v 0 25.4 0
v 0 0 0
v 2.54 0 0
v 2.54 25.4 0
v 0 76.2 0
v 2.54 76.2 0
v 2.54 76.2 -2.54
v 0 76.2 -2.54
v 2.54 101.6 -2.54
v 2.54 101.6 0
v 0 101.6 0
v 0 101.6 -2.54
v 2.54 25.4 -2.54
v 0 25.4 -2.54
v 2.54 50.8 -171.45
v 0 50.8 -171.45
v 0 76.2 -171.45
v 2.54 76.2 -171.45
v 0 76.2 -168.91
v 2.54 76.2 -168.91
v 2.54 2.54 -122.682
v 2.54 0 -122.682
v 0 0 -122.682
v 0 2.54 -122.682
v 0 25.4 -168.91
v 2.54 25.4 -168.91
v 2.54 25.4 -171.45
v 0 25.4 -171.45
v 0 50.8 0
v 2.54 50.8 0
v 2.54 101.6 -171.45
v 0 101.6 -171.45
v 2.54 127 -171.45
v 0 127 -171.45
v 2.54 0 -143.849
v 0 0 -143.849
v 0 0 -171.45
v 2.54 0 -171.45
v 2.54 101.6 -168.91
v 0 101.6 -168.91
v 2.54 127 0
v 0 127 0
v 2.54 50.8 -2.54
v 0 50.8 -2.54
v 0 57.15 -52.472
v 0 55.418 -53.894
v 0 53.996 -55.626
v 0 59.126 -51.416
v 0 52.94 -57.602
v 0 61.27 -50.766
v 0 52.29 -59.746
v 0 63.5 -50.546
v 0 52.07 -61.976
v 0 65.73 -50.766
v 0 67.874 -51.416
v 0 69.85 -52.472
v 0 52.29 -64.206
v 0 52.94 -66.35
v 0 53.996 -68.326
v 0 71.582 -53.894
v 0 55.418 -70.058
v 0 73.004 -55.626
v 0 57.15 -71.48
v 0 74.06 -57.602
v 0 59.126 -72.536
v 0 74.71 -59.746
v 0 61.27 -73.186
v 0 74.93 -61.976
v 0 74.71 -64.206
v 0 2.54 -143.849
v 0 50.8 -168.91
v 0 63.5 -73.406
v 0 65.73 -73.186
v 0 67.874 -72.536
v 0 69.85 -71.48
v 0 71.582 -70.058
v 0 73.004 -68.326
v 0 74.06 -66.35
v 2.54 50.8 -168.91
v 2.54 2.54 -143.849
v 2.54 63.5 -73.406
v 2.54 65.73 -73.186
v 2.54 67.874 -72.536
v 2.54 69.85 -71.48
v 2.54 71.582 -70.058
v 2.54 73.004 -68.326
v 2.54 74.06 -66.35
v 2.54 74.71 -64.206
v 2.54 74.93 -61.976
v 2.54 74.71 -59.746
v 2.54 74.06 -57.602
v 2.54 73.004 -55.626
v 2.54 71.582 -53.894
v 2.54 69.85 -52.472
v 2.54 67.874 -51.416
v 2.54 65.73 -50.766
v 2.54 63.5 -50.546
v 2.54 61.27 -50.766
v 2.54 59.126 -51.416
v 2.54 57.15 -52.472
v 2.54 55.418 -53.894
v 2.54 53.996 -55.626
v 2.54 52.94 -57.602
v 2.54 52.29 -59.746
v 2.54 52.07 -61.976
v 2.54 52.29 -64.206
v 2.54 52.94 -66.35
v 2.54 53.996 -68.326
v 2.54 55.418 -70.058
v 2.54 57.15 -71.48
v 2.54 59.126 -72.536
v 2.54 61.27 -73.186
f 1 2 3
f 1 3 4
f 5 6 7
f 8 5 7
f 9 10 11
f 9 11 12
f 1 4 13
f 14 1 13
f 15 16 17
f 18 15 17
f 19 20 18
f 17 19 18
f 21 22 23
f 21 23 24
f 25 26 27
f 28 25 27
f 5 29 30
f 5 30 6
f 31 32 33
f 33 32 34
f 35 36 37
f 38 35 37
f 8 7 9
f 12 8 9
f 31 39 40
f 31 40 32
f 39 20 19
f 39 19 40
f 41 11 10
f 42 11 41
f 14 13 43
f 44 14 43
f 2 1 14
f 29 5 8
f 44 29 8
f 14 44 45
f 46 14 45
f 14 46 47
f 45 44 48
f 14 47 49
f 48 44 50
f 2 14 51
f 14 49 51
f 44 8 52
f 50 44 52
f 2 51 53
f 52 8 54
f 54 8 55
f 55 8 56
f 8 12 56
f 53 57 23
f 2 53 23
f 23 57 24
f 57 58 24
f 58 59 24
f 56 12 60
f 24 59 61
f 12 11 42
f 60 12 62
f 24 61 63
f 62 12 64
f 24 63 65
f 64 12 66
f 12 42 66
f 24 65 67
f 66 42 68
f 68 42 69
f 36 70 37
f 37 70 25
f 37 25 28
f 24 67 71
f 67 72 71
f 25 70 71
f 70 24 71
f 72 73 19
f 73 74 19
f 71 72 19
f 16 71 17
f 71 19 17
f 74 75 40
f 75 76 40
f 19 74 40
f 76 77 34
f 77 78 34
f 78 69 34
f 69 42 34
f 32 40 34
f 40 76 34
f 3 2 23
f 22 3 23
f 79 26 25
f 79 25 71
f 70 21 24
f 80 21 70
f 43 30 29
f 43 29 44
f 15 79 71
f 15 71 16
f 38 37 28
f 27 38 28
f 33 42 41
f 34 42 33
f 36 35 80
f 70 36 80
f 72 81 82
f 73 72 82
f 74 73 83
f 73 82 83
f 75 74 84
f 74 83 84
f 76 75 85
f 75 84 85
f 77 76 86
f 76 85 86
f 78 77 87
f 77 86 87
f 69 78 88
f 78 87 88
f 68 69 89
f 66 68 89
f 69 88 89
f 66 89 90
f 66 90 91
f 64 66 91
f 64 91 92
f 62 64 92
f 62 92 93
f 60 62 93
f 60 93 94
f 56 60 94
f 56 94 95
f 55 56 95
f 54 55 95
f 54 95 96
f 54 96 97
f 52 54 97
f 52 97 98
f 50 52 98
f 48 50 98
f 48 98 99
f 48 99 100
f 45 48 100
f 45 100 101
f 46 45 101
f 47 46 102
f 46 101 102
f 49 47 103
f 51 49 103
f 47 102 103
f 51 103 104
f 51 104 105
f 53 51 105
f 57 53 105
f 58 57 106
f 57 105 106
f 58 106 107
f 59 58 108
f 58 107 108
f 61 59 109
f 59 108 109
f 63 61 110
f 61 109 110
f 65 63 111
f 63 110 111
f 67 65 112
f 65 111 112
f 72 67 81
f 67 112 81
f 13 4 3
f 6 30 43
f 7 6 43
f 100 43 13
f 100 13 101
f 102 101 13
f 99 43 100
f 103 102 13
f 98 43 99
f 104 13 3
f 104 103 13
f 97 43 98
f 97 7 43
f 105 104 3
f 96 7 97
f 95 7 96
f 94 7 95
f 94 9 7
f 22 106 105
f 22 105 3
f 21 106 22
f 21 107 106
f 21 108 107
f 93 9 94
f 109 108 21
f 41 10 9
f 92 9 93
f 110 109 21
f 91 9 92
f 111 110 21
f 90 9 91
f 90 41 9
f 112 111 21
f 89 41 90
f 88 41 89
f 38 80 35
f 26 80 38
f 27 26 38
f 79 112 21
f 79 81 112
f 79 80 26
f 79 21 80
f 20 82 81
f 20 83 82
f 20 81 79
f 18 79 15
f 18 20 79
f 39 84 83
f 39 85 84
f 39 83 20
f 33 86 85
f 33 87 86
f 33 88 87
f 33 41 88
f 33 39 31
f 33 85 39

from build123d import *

# Parameters (mm, degrees)
SKETCH1_W           = 171.45
SKETCH1_H           = 127
BOSS_EXTRUDE1_DEPTH = 2.54
SKETCH2_W           = 2.54
SKETCH2_H           = 25.4
CUT_EXTRUDE1_DEPTH  = 3.54
SKETCH3_R           = 11.43
CUT_EXTRUDE2_DEPTH  = 3.54
SKETCH4_W           = 21.166666667
SKETCH4_H           = 2.54
CUT_EXTRUDE3_DEPTH  = 3.54


with BuildPart() as part:
    # Sketch1 → Boss-Extrude1 (new body)
    with BuildSketch(Plane(origin=(0, 0, 0), x_dir=(0, 0, -1), z_dir=(1, 0, 0))):
        with Locations((85.725, 63.5)):
            Rectangle(SKETCH1_W, SKETCH1_H)
    extrude(amount=BOSS_EXTRUDE1_DEPTH)

    # Sketch2 → Cut-Extrude1 (cut, through all)
    with BuildSketch(Plane(origin=(2.54, 0, 0), x_dir=(0, 0, -1), z_dir=(1, 0, 0))):
        with Locations((1.27, 88.9)):
            Rectangle(SKETCH2_W, SKETCH2_H)
        with Locations((1.27, 38.1)):
            Rectangle(SKETCH2_W, SKETCH2_H)
        with Locations((170.18, 88.9)):
            Rectangle(SKETCH2_W, SKETCH2_H)
        with Locations((170.18, 38.1)):
            Rectangle(SKETCH2_W, SKETCH2_H)
    extrude(amount=-CUT_EXTRUDE1_DEPTH, mode=Mode.SUBTRACT)

    # Sketch3 → Cut-Extrude2 (cut, through all)
    with BuildSketch(Plane(origin=(2.54, 0, 0), x_dir=(0, 0, -1), z_dir=(1, 0, 0))):
        with Locations((61.976, 63.5)):
            Circle(SKETCH3_R)
    extrude(amount=-CUT_EXTRUDE2_DEPTH, mode=Mode.SUBTRACT)

    # Sketch4 → Cut-Extrude3 (cut, through all)
    with BuildSketch(Plane(origin=(2.54, 0, 0), x_dir=(0, 0, -1), z_dir=(1, 0, 0))):
        with Locations((133.265333333, 1.27)):
            Rectangle(SKETCH4_W, SKETCH4_H)
    extrude(amount=-CUT_EXTRUDE3_DEPTH, mode=Mode.SUBTRACT)


solid = part.part
